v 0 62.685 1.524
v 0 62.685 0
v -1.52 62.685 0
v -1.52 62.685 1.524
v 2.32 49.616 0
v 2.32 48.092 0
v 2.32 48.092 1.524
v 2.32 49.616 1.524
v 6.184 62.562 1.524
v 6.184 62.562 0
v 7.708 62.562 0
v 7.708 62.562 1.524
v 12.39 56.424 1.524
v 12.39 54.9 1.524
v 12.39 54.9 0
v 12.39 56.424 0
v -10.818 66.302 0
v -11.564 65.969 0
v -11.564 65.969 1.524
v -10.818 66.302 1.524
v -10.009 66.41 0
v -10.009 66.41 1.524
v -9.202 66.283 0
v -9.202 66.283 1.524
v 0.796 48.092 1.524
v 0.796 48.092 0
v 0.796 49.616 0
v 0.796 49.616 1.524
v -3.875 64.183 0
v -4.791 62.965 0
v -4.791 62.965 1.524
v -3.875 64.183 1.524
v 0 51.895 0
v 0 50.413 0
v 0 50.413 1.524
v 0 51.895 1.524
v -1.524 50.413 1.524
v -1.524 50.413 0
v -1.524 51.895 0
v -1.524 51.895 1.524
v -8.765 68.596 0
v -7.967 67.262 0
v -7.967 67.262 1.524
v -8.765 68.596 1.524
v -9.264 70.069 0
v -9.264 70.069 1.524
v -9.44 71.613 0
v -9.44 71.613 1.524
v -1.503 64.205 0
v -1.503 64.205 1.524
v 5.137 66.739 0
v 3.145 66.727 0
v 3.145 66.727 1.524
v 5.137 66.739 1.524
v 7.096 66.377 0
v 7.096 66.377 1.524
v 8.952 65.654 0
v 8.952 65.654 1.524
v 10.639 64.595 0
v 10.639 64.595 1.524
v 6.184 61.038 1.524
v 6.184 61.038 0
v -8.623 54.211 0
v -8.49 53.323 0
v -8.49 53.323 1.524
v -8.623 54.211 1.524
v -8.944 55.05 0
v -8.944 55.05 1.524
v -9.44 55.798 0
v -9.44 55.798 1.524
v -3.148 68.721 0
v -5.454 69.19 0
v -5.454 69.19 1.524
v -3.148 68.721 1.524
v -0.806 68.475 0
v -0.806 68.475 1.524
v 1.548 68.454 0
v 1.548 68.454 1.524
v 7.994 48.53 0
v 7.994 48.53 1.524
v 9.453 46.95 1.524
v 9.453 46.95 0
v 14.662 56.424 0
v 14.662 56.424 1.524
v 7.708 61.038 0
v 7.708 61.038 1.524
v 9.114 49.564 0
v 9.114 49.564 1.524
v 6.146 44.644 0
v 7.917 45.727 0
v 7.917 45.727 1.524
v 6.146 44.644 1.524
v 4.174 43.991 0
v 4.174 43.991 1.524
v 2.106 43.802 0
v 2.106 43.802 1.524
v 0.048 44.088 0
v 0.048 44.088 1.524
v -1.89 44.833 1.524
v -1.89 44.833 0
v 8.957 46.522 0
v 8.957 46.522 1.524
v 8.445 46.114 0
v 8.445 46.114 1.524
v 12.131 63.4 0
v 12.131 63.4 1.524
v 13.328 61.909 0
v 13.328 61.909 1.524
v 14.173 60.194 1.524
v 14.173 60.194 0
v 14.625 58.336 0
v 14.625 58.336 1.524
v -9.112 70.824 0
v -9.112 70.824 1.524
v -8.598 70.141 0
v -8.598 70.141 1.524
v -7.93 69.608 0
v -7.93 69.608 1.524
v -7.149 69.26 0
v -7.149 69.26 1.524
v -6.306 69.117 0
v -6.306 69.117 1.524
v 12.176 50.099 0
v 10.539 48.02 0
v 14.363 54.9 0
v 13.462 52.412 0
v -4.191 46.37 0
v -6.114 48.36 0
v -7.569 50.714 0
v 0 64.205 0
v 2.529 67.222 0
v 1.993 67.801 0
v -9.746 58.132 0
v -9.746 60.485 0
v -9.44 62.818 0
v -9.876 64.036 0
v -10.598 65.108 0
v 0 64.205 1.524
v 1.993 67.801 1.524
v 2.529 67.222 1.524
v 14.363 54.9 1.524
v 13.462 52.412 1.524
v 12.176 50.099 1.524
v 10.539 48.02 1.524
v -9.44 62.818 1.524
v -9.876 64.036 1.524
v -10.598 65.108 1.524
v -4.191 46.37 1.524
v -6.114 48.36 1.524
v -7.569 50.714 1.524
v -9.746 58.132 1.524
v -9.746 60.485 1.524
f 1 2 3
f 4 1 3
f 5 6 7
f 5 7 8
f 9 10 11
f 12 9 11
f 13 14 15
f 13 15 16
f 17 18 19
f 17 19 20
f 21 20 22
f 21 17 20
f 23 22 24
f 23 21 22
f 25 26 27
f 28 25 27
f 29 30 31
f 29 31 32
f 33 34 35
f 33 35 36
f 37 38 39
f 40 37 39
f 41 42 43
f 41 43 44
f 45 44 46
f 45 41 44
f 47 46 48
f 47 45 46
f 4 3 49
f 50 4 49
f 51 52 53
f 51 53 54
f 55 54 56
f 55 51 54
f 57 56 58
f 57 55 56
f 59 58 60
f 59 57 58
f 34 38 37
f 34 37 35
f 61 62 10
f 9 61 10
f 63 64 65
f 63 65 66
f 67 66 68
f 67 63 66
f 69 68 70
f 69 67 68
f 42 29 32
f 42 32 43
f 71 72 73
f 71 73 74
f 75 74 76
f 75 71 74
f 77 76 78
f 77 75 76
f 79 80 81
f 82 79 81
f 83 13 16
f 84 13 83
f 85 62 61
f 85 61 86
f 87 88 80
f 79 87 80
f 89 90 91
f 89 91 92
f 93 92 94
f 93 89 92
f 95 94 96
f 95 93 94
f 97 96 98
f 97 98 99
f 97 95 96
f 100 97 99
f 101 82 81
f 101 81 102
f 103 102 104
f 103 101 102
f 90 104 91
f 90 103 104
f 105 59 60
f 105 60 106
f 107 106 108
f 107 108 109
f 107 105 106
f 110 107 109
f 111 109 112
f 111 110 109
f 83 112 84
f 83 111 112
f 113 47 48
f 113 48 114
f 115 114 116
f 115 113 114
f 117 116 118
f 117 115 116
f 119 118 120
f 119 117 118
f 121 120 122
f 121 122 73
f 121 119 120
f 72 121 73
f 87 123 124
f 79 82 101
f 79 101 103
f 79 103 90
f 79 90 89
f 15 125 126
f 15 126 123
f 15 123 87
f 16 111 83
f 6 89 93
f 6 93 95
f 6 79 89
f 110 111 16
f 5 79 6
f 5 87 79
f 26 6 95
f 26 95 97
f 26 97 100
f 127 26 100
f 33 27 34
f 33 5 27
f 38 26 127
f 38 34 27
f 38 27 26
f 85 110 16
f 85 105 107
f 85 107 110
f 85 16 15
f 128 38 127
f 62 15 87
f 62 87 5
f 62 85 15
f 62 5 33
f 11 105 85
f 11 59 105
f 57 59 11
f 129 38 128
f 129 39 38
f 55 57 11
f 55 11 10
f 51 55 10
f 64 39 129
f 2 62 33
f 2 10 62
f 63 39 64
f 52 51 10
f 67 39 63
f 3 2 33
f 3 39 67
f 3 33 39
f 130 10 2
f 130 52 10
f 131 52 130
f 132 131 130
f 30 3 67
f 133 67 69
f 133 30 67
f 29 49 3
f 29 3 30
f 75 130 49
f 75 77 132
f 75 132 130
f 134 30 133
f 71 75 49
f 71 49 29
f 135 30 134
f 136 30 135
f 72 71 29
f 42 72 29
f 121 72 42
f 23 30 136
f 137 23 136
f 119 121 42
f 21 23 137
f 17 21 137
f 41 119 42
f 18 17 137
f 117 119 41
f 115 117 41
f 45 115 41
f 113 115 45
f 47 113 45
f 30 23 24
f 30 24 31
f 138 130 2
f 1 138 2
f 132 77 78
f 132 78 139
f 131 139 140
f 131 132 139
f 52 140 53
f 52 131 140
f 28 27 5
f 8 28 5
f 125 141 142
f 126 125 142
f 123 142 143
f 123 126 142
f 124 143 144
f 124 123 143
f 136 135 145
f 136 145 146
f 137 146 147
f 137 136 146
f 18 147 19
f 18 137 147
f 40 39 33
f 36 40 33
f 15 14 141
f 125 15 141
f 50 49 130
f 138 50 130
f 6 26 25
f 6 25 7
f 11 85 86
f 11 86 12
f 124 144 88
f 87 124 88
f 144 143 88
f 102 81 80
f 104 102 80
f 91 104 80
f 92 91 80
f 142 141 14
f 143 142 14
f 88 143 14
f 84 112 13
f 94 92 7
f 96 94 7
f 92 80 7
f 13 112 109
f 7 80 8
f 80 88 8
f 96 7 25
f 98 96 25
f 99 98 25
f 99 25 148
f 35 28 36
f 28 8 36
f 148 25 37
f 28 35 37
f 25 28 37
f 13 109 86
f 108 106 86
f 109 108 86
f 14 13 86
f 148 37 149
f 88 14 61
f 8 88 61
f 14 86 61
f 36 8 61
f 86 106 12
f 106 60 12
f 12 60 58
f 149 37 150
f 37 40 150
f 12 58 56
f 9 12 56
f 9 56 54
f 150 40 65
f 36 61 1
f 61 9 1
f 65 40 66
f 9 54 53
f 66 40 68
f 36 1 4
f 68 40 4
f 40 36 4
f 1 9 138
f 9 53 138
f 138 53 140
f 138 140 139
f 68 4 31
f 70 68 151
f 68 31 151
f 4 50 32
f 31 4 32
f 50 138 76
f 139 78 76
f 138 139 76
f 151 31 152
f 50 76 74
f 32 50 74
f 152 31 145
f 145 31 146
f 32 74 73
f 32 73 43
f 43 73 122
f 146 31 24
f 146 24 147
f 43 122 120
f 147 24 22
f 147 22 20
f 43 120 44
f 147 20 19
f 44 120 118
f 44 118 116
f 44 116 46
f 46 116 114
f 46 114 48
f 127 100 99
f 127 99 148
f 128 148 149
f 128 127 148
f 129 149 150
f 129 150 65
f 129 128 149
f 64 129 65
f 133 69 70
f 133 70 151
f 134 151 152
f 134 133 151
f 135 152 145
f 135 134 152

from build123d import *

# Parameters (mm, degrees)
SKETCH1_W           = 1.524
SKETCH1_H           = 1.481764771
SKETCH1_H_2         = 1.524
BOSS_EXTRUDE1_DEPTH = 1.524
SKETCH2_W           = 2.901164826
SKETCH2_H           = 1.524
CUT_EXTRUDE1_DEPTH  = 1.524


with BuildPart() as part:
    # Sketch1 → Boss-Extrude1 (new body)
    with BuildSketch(Plane.XY):
        with BuildLine():
            Line((-9.201867242, 66.283387572), (-4.791154517, 62.964734812))
            Line((-4.791154517, 62.964734812), (-3.874879328, 64.182526165))
            Line((-3.874879328, 64.182526165), (-7.967249174, 67.261655396))
            ThreePointArc((-7.967249174, 67.261655396), (-9.053535436, 69.319058784), (-9.439830642, 71.613334825))
            ThreePointArc((-9.439830642, 71.613334825), (-7.929515653, 69.608329431), (-5.454408435, 69.190068442))
            ThreePointArc((-5.454408435, 69.190068442), (-1.979913279, 68.569755109), (1.547610416, 68.453643912))
            ThreePointArc((1.547610416, 68.453643912), (2.250493371, 67.501534847), (3.14522315, 66.726928661))
            ThreePointArc((3.14522315, 66.726928661), (7.095824067, 66.377438321), (10.638674299, 64.594854987))
            ThreePointArc((10.638674299, 64.594854987), (13.932057854, 60.788978675), (14.582785292, 55.798224871))
            ThreePointArc((14.582785292, 55.798224871), (12.199808945, 50.134207473), (7.917480129, 45.72724375))
            ThreePointArc((7.917480129, 45.72724375), (3.14522315, 43.837178873), (-1.890077483, 44.833436601))
            ThreePointArc((-1.890077483, 44.833436601), (-6.113668677, 48.360365036), (-8.490380039, 53.323145493))
            ThreePointArc((-8.490380039, 53.323145493), (-8.760469415, 54.639184362), (-9.439830642, 55.798224871))
            ThreePointArc((-9.439830642, 55.798224871), (-9.784898441, 59.308308116), (-9.439830642, 62.818391362))
            ThreePointArc((-9.439830642, 62.818391362), (-10.203506988, 64.594854987), (-11.563650446, 65.969276447))
            ThreePointArc((-11.563650446, 65.969276447), (-10.417196882, 66.385269605), (-9.201867242, 66.283387572))
        make_face()
        Polygon((-1.502614608, 64.205247413), (0, 64.205247413), (0, 62.684788315), (-1.519736188, 62.684788315), align=None, mode=Mode.SUBTRACT)
        with Locations((-0.762, 51.153972349)):
            Rectangle(SKETCH1_W, SKETCH1_H, mode=Mode.SUBTRACT)
        with Locations((6.945775543, 61.8002372)):
            Rectangle(SKETCH1_W, SKETCH1_H_2, mode=Mode.SUBTRACT)
        with Locations((1.55818596, 48.853678484)):
            Rectangle(SKETCH1_W, SKETCH1_H_2, mode=Mode.SUBTRACT)
    extrude(amount=BOSS_EXTRUDE1_DEPTH)

    # Sketch2 → Cut-Extrude1 (cut)
    with BuildSketch(Plane.XY.offset(1.524)):
        Polygon((10.838910474, 47.694983966), (9.113748292, 49.563912383), (7.993907093, 48.530214319), (9.719069274, 46.661285901), align=None)
        with Locations((13.841078696, 55.662305548)):
            Rectangle(SKETCH2_W, SKETCH2_H)
    extrude(amount=-CUT_EXTRUDE1_DEPTH, mode=Mode.SUBTRACT)


solid = part.part
